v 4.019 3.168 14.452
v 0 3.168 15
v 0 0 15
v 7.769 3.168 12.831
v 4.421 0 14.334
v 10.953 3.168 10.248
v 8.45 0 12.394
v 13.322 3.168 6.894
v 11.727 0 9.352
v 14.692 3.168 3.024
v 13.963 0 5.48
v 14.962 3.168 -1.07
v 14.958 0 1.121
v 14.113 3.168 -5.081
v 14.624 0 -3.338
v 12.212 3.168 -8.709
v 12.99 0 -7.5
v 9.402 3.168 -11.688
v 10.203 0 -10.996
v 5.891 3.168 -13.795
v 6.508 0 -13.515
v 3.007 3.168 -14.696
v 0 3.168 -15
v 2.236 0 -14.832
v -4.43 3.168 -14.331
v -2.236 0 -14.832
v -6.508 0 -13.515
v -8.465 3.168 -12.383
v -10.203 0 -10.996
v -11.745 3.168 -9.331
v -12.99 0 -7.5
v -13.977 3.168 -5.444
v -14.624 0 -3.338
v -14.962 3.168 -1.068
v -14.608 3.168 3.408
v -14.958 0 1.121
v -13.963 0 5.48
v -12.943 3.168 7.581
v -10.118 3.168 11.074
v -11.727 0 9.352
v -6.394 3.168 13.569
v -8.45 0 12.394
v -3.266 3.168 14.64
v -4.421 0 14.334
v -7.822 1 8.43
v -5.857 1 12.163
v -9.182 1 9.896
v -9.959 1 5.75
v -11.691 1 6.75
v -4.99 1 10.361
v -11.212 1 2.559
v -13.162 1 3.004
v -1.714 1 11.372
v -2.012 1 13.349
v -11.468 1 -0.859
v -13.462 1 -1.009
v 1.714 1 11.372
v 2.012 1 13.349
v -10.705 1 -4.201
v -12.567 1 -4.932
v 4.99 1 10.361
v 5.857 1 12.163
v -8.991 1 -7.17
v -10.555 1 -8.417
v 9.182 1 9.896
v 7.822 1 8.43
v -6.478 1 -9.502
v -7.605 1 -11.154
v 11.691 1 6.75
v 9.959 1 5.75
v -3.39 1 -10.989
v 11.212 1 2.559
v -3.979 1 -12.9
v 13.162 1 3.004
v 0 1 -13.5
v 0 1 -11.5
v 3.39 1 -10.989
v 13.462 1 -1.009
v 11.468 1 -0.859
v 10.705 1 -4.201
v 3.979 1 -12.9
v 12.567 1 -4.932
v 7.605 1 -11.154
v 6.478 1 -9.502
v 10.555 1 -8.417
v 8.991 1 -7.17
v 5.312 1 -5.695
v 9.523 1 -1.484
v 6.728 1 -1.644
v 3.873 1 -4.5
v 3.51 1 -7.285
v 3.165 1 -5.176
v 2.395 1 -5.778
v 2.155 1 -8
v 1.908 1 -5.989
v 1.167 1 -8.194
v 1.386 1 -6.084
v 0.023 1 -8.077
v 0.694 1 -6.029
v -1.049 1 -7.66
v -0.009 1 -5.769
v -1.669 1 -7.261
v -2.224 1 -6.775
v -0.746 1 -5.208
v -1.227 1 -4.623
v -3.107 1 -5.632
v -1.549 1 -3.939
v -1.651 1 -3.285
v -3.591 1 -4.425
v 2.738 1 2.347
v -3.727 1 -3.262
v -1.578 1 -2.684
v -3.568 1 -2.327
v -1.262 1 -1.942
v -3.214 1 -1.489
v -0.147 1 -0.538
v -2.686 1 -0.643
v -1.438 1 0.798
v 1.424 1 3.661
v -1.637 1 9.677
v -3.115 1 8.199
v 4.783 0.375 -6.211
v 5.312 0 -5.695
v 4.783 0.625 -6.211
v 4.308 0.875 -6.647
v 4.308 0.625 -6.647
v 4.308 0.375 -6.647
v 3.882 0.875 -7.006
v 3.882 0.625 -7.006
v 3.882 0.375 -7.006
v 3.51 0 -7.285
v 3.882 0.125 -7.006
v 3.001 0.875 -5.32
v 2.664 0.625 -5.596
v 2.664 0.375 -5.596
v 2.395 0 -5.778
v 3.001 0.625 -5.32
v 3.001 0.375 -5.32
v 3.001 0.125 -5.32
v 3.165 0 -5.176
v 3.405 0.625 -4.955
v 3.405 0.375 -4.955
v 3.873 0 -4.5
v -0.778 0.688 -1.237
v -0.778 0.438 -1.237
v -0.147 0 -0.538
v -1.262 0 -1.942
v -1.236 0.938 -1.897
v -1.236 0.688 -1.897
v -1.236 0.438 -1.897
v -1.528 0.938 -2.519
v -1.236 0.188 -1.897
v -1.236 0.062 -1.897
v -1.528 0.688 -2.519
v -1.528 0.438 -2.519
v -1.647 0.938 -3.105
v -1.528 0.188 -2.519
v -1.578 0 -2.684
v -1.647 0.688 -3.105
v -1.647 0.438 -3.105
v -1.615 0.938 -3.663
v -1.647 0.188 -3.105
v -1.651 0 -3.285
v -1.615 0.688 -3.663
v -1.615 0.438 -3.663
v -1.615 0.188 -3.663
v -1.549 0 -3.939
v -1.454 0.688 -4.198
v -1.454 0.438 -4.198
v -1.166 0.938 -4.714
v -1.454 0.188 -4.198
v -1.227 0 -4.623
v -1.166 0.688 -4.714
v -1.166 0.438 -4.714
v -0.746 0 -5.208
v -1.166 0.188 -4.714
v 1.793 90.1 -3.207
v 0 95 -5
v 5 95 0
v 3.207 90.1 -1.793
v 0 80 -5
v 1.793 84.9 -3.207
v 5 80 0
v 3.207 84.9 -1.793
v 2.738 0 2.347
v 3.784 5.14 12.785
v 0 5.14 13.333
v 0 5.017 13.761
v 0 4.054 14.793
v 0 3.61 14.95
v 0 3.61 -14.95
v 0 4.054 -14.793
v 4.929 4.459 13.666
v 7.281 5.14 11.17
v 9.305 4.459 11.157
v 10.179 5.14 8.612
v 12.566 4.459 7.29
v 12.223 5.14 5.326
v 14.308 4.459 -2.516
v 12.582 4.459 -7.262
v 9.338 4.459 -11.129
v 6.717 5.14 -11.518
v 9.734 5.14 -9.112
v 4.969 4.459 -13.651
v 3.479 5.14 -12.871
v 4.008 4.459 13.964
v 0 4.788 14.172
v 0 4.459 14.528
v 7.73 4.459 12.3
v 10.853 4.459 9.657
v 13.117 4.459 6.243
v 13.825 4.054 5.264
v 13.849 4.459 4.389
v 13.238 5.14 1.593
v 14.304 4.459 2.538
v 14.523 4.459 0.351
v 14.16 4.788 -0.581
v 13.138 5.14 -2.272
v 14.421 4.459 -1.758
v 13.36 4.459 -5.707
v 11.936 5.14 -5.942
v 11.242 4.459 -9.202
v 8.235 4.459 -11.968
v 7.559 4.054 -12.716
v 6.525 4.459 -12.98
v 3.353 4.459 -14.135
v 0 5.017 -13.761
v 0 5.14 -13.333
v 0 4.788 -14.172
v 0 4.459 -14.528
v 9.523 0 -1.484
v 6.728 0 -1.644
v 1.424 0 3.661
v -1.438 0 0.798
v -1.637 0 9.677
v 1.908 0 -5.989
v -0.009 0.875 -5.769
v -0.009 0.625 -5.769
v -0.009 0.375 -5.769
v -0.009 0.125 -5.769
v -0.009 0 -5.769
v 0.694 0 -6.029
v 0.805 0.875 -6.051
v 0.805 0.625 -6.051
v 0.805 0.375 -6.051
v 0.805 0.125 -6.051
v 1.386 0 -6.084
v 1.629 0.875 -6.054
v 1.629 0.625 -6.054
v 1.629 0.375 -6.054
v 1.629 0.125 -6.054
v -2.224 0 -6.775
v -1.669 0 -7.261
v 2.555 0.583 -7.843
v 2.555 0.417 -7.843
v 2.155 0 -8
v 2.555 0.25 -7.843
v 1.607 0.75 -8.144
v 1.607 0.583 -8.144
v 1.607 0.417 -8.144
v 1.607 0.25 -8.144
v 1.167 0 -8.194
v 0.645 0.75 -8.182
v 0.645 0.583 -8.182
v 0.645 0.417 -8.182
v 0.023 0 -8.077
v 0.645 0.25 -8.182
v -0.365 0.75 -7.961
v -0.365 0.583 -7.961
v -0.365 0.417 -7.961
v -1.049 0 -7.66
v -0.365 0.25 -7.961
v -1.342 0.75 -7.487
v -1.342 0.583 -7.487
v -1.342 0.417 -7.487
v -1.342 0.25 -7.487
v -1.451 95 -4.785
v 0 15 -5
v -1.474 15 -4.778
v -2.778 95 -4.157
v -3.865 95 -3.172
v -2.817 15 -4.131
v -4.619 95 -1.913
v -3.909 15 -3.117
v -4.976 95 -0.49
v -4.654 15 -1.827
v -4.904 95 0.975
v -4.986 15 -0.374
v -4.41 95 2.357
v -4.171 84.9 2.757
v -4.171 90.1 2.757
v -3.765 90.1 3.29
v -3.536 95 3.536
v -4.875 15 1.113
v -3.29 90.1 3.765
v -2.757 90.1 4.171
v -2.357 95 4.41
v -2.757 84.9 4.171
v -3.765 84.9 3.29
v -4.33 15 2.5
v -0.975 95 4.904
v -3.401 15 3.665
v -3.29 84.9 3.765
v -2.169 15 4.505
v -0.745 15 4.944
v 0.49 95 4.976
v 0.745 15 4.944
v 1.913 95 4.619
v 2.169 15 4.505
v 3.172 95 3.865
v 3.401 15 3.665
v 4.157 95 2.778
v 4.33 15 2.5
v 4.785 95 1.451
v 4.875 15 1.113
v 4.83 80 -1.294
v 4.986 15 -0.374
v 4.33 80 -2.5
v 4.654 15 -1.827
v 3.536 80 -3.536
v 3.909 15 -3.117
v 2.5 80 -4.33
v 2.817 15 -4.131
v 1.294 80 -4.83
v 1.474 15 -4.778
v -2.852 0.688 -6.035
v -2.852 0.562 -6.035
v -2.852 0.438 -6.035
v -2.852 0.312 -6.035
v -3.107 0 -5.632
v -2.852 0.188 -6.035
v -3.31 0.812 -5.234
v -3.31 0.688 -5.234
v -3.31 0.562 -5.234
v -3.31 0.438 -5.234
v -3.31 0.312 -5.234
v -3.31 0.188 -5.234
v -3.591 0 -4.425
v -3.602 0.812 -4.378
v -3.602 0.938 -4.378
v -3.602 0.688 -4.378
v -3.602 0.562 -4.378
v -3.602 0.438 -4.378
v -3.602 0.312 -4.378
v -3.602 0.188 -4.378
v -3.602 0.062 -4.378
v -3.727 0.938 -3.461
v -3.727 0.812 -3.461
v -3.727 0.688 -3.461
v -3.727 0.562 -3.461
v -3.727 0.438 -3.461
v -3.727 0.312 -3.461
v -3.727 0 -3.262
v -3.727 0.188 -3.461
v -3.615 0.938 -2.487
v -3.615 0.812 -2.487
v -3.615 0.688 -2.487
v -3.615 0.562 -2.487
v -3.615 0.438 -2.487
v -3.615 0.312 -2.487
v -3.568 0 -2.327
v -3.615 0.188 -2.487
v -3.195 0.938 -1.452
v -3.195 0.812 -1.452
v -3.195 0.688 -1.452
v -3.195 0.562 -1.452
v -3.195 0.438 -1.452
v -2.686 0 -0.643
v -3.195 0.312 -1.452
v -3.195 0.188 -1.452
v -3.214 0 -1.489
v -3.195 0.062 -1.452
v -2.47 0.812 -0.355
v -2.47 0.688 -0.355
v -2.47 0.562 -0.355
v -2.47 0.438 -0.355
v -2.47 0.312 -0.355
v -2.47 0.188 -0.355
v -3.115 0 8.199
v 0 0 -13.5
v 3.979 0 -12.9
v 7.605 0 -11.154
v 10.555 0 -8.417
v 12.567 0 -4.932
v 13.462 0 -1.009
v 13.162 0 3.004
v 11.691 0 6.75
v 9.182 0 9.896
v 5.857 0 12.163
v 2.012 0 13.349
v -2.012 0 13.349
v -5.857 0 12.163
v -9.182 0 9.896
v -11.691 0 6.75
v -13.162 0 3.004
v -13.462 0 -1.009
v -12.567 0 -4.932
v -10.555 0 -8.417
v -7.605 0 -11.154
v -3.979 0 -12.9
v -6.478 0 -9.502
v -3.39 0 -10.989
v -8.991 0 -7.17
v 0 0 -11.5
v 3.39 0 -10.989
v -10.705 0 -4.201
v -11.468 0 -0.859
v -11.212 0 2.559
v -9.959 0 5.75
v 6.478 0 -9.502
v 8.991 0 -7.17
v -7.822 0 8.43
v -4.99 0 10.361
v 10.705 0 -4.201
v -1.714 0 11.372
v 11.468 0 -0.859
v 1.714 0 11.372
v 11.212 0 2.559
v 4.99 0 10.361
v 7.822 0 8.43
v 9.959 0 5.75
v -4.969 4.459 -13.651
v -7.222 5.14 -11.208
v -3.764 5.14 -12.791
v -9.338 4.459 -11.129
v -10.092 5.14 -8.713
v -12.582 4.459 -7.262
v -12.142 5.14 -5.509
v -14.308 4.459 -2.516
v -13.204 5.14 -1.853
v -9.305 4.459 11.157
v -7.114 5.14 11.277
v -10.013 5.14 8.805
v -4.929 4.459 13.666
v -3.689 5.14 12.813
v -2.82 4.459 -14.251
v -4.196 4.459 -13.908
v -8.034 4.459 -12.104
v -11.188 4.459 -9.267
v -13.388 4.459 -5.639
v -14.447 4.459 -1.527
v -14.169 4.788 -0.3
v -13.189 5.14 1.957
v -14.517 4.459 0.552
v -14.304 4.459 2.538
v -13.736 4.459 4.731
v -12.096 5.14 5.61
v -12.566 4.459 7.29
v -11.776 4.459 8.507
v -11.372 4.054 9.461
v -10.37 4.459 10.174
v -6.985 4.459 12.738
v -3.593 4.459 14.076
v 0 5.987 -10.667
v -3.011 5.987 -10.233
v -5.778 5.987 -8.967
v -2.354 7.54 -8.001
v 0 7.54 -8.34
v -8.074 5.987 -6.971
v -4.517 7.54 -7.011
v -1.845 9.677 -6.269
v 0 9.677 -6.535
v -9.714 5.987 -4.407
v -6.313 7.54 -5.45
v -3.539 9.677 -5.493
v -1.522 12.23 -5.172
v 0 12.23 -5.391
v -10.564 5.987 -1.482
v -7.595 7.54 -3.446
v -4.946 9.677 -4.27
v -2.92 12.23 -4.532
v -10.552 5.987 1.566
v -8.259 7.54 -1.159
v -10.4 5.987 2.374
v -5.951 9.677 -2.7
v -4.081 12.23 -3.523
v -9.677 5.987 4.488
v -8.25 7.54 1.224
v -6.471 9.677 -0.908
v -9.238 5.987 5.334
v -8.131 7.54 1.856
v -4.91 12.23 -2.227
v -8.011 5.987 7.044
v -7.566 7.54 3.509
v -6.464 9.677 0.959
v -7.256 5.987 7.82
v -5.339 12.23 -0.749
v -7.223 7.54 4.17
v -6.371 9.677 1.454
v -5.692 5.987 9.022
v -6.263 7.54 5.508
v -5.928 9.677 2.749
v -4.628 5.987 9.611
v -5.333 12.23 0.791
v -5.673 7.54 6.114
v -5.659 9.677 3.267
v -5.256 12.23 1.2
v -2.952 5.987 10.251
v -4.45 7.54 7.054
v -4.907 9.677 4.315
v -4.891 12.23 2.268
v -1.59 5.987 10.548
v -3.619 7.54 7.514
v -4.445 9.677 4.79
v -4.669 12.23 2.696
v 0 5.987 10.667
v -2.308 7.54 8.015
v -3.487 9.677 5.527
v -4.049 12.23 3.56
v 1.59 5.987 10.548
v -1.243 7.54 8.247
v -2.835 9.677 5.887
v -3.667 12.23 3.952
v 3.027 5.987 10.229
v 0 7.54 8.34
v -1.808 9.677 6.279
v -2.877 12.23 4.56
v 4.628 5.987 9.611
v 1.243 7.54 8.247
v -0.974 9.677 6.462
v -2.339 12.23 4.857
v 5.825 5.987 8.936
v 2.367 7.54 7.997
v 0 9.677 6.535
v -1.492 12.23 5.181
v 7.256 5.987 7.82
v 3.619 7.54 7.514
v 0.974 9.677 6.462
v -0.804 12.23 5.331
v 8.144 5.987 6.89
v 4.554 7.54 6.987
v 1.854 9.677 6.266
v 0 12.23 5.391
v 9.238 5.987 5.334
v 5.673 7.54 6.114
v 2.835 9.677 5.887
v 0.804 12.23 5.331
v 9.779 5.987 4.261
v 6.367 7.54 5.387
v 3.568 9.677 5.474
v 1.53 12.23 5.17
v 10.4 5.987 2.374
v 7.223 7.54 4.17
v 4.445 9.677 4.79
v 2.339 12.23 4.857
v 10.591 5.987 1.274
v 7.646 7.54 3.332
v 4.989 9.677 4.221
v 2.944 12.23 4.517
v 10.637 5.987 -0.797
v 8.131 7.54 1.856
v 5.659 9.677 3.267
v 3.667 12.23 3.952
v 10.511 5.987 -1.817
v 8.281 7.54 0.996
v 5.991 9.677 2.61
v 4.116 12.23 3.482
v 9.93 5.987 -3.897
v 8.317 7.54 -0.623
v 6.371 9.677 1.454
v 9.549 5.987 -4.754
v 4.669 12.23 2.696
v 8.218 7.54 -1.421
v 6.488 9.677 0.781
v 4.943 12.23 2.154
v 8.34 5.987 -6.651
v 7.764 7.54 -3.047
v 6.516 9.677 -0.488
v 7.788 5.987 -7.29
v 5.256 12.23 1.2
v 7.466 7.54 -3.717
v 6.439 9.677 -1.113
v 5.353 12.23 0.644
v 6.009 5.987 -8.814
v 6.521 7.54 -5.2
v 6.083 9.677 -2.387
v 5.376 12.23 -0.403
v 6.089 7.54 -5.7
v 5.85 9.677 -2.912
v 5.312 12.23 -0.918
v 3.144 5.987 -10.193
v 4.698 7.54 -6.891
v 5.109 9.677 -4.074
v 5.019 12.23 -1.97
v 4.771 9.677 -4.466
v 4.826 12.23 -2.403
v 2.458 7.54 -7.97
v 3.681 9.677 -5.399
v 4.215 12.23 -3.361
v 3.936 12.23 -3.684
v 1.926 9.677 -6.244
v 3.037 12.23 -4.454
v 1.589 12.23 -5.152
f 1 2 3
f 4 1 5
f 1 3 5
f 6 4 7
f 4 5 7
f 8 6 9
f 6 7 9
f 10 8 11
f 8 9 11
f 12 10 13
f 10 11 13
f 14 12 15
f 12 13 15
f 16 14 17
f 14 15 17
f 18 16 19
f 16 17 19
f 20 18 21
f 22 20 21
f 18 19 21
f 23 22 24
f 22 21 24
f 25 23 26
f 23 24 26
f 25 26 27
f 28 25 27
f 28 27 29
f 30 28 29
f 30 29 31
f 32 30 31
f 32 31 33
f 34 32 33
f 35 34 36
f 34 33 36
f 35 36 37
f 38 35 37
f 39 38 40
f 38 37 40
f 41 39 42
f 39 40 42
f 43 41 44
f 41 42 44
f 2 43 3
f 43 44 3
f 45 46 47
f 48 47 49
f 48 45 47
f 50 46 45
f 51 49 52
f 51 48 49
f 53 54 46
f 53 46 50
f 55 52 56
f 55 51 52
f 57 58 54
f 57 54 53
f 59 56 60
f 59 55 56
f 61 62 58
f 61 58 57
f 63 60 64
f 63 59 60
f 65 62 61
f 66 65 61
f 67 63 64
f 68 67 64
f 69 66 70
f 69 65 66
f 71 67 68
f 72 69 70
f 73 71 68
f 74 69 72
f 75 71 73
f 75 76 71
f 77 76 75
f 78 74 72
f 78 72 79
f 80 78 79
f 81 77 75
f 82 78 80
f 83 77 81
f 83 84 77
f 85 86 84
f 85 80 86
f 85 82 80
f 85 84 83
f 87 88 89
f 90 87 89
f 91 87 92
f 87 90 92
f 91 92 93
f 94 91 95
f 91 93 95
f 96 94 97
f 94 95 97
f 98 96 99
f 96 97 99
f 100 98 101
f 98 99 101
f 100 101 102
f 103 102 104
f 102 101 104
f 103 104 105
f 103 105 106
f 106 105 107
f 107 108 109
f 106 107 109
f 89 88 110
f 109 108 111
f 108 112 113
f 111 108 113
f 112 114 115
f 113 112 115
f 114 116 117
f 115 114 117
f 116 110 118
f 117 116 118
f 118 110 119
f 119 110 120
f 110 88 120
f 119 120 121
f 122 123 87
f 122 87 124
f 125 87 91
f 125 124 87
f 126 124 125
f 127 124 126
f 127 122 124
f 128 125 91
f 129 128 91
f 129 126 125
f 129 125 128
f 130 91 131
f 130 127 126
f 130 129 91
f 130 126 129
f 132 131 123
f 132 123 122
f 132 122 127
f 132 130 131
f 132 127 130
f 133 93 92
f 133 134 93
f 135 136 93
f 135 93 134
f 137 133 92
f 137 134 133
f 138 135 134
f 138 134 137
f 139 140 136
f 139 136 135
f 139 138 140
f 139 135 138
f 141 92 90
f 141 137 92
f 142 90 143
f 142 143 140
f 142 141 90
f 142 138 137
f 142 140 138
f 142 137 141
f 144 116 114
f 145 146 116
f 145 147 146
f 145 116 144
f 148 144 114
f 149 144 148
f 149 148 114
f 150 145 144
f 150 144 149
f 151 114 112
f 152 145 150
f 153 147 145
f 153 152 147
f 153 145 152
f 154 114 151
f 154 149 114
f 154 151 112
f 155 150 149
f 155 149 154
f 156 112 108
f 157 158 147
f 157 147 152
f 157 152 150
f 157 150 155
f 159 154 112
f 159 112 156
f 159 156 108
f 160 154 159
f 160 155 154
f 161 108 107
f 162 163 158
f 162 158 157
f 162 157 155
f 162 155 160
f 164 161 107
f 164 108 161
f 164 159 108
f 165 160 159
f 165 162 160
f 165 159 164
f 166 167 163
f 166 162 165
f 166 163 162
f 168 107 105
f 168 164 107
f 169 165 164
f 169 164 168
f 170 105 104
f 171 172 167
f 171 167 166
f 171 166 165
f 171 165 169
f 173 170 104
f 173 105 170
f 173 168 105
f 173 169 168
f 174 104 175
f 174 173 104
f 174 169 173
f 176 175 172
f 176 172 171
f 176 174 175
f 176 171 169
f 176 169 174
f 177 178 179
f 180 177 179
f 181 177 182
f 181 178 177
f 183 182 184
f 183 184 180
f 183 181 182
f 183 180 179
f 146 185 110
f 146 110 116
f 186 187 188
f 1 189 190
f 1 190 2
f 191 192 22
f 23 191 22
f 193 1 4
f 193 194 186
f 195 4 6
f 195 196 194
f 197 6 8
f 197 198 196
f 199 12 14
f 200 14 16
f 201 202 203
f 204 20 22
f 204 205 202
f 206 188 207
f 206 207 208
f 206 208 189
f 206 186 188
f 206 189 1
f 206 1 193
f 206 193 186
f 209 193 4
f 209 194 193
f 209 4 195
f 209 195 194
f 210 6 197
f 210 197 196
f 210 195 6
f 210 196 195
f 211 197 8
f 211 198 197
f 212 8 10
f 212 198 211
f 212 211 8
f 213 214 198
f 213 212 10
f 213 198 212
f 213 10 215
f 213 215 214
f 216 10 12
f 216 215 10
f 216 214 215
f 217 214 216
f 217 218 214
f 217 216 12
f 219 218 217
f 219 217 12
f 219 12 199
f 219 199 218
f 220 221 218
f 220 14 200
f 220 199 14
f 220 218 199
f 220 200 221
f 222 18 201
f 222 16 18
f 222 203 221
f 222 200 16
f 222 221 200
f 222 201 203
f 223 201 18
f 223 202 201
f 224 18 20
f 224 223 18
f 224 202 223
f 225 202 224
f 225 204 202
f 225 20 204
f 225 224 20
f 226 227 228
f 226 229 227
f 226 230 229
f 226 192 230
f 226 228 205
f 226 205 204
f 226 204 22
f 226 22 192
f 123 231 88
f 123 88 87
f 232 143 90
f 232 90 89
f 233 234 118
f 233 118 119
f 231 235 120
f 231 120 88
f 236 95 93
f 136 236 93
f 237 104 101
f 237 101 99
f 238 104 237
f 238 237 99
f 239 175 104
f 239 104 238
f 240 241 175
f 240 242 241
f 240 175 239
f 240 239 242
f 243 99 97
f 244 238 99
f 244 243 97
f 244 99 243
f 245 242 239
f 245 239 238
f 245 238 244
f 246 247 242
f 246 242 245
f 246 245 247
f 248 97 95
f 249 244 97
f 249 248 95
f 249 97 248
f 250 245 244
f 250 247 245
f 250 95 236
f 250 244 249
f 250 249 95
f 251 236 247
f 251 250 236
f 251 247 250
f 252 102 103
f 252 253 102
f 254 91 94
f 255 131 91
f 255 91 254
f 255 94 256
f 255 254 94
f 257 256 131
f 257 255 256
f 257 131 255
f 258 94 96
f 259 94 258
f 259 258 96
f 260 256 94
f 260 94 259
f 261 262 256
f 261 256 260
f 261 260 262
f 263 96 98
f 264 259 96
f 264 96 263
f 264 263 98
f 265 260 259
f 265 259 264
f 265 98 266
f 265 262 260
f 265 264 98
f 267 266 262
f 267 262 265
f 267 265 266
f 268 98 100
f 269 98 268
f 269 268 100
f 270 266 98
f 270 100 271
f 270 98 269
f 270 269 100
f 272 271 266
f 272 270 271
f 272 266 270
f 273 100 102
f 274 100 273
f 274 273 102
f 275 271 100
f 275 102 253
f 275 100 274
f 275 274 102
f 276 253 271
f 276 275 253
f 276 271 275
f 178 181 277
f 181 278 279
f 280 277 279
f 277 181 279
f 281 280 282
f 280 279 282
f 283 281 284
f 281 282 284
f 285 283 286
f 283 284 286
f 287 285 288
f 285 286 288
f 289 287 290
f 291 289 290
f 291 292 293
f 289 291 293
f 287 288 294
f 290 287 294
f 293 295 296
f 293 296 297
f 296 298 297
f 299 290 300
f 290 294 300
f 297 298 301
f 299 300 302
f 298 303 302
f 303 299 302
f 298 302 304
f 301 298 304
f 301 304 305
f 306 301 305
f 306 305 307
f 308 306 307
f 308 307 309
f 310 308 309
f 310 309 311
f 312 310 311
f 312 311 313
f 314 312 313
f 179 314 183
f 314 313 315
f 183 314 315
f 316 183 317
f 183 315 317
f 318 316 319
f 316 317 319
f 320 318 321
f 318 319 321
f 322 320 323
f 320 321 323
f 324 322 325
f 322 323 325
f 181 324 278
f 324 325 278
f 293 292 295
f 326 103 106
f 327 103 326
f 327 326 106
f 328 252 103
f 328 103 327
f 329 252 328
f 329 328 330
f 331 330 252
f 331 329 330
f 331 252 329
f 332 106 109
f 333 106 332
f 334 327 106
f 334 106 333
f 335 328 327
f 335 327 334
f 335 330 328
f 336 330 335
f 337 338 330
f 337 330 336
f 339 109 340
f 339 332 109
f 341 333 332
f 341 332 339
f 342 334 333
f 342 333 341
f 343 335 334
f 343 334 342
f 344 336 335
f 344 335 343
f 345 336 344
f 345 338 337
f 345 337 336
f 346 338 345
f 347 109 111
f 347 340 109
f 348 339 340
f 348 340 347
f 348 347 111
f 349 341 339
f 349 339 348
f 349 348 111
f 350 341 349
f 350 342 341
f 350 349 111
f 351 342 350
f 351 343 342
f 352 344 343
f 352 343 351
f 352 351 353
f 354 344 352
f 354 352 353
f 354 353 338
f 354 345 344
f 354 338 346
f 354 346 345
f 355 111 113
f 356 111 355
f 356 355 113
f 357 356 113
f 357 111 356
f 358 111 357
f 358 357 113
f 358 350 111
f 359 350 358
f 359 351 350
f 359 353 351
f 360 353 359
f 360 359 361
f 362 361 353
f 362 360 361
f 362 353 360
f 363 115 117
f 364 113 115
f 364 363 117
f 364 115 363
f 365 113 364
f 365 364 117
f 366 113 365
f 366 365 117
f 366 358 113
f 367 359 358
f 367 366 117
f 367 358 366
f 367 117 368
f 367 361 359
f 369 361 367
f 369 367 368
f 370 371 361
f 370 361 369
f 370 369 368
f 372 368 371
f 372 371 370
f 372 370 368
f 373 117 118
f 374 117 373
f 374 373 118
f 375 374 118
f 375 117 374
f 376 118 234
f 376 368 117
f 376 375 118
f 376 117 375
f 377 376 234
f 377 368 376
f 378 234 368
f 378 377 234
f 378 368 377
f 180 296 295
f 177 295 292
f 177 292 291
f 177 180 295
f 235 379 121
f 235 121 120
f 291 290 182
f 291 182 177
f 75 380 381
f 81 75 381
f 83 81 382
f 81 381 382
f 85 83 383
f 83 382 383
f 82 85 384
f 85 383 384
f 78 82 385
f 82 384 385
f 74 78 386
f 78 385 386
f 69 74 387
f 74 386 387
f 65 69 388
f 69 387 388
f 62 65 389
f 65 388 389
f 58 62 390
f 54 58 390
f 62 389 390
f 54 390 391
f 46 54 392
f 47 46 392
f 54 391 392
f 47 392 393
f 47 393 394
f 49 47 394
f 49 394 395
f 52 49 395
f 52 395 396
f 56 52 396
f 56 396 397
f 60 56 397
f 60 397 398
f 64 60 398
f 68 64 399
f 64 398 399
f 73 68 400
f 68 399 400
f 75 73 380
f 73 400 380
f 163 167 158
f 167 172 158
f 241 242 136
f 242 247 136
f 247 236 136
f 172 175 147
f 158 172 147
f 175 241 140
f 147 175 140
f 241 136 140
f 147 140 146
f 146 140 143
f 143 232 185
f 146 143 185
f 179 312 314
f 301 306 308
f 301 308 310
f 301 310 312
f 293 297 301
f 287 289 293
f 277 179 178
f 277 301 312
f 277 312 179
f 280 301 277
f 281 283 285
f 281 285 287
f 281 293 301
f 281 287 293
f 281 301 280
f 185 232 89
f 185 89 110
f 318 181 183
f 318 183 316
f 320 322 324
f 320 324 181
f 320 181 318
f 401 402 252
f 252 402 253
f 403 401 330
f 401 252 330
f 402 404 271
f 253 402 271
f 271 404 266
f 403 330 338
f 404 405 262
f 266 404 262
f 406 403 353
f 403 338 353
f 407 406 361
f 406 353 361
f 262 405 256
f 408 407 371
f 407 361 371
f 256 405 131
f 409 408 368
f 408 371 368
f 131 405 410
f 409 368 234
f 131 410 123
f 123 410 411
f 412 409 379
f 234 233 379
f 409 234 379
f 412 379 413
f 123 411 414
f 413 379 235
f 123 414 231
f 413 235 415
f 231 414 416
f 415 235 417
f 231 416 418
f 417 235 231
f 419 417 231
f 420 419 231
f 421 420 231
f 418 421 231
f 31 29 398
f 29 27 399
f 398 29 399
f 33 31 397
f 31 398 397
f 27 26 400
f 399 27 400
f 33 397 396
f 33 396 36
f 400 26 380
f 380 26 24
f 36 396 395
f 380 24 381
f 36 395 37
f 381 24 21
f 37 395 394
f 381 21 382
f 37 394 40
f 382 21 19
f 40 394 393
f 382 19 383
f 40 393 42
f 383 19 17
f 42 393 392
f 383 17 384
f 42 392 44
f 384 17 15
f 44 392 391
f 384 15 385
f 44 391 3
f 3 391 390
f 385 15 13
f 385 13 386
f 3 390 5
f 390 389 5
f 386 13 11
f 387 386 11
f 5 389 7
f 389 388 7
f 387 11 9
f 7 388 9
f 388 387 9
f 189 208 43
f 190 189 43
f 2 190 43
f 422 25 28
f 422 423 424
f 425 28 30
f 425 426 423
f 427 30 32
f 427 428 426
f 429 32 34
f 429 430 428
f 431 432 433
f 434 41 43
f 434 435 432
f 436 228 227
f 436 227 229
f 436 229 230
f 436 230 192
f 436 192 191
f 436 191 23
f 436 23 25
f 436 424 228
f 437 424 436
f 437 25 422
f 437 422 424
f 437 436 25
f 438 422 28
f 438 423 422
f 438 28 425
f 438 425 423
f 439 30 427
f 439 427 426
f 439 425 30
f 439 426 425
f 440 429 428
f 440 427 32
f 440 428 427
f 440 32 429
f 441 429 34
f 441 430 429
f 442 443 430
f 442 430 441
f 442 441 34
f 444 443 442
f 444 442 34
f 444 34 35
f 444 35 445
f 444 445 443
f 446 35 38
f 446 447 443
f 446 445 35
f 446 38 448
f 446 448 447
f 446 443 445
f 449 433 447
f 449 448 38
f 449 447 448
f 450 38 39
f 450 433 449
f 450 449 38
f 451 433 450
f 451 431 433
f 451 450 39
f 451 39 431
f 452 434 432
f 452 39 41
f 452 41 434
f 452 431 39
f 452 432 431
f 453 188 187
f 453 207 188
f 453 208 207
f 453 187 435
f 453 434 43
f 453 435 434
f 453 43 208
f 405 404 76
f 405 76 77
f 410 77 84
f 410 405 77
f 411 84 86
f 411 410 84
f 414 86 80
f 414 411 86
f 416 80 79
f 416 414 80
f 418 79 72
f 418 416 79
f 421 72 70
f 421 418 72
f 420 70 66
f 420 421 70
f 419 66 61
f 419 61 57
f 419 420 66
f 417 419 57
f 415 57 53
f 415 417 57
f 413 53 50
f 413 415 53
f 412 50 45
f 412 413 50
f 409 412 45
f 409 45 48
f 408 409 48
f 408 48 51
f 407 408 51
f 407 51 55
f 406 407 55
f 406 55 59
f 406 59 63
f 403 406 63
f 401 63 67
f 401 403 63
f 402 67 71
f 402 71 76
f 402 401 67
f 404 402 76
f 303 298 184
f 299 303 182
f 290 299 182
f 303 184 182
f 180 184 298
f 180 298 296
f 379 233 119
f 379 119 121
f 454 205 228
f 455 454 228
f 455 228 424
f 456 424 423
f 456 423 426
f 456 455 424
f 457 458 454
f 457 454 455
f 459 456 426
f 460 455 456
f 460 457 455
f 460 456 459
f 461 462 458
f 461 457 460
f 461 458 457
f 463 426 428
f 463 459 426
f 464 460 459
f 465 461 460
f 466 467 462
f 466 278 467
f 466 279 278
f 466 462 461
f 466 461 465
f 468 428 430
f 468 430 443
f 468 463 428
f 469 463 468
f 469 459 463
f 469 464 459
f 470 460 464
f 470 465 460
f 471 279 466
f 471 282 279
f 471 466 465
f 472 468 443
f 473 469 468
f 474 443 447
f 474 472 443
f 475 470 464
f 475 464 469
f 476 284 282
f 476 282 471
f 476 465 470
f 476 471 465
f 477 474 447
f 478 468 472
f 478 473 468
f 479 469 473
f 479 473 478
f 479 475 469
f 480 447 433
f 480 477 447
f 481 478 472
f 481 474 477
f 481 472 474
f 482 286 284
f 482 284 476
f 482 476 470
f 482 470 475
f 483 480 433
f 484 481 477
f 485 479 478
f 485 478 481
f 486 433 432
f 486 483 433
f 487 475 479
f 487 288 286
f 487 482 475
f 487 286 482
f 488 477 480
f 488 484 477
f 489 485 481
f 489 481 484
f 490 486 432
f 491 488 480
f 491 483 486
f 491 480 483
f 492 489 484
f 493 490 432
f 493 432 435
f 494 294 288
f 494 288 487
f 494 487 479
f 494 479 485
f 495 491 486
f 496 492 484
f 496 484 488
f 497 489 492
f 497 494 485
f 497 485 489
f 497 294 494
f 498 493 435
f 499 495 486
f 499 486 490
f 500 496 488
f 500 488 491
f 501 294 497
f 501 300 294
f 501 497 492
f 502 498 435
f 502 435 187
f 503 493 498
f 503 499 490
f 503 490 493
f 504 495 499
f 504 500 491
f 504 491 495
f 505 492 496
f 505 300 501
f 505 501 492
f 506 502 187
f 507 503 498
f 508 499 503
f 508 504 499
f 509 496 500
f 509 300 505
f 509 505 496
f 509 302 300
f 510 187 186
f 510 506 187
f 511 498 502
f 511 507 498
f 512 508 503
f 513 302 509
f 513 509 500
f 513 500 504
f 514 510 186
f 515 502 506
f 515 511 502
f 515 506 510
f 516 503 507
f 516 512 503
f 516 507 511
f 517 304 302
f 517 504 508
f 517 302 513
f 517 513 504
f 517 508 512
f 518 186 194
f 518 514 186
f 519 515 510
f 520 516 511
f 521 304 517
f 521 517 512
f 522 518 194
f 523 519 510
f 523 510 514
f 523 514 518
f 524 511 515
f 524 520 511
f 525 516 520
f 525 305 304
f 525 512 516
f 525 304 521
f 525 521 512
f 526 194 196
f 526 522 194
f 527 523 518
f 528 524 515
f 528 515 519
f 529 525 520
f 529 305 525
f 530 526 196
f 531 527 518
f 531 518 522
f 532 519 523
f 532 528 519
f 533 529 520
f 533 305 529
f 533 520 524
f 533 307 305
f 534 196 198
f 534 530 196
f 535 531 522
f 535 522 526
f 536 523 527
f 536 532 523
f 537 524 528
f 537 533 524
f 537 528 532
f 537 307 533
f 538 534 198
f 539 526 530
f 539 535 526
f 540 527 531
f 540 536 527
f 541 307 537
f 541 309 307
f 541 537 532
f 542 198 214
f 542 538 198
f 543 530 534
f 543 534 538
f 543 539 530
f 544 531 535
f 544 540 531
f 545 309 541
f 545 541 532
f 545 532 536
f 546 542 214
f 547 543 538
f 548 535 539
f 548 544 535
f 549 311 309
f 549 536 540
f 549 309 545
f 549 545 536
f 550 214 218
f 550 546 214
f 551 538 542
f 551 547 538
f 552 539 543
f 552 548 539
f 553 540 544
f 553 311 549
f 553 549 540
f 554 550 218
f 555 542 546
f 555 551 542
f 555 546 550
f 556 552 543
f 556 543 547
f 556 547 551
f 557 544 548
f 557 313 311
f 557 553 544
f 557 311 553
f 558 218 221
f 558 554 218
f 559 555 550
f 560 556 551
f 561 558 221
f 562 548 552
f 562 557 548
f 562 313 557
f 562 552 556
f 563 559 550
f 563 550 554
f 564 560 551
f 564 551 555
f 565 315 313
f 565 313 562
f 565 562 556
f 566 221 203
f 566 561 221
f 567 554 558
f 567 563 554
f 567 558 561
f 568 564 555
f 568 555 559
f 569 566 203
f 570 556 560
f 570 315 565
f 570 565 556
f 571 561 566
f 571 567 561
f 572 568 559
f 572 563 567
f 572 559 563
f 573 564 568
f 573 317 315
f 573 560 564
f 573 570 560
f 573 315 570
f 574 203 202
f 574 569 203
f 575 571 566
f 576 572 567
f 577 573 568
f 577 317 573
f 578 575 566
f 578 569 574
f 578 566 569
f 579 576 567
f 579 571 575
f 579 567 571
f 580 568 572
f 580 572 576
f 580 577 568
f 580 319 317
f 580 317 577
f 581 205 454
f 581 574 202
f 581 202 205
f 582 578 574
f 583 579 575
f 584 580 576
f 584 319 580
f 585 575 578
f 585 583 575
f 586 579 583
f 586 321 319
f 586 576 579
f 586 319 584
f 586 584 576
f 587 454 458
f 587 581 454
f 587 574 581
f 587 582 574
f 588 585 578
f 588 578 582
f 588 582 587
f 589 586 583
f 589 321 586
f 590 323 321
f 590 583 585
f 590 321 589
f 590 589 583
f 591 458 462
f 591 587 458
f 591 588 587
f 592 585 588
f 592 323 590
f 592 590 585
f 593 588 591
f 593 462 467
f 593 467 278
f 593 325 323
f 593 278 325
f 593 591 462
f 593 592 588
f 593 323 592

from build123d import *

# Parameters (mm, degrees)
SKETCH1_R           = 15
BOSS_EXTRUDE1_DEPTH = 5
SKETCH2_R           = 5
BOSS_EXTRUDE2_DEPTH = 90
CUT_EXTRUDE1_START  = -15
CUT_EXTRUDE1_DEPTH  = 15
SKETCH4_W           = 2
SKETCH4_H           = 5.2
CUT_EXTRUDE2_DEPTH  = 99.17076958
FILLET1_R           = 10
FILLET2_R           = 2
CUT_EXTRUDE3_DEPTH  = 1
SKETCH6_R           = 13.5
SKETCH6_R_2         = 11.5
CUT_EXTRUDE4_DEPTH  = 1


with BuildPart() as part:
    # Sketch1 → Boss-Extrude1 (new body)
    with BuildSketch(Plane(origin=(0, 0, 0), x_dir=(1, 0, 0), z_dir=(0, 1, 0))):
        with Locations(Location((0, 0, 0), (0, 0, 270))):
            Circle(SKETCH1_R)
    extrude(amount=BOSS_EXTRUDE1_DEPTH)

    # Sketch2 → Boss-Extrude2 (add)
    with BuildSketch(Plane(origin=(0, 5, 0), x_dir=(1, 0, 0), z_dir=(0, 1, 0))):
        with Locations(Location((0, 0, 0), (0, 0, 90))):
            Circle(SKETCH2_R)
    extrude(amount=BOSS_EXTRUDE2_DEPTH)

    # Sketch3 → Cut-Extrude1 (cut)
    with BuildSketch(Plane(origin=(0, 95, 0), x_dir=(1, 0, 0), z_dir=(0, 1, 0)).offset(CUT_EXTRUDE1_START)):
        with BuildLine():
            Line((0, 5), (5, 0))
            ThreePointArc((5, 0), (3.535533906, 3.535533906), (0, 5))
        make_face()
    extrude(amount=CUT_EXTRUDE1_DEPTH, mode=Mode.SUBTRACT)

    # Sketch4 → Cut-Extrude2 (cut, through all)
    with BuildSketch(Plane(origin=(2.5, 0, -2.5), x_dir=(-0.7071067811865475, 0, -0.7071067811865477), z_dir=(0.7071067811865477, 0, -0.7071067811865475))):
        with Locations((0, 87.5)):
            Rectangle(SKETCH4_W, SKETCH4_H)
    extrude(amount=-CUT_EXTRUDE2_DEPTH, mode=Mode.SUBTRACT)

    # Fillet1
    fillet1_edges = [part.edges().sort_by_distance(p)[0] for p in [
        (0, 5, 5),
    ]]
    fillet(fillet1_edges, radius=FILLET1_R - 0.0001)  # a hair under: the kernel refuses the full size

    # Fillet2
    fillet2_edges = [part.edges().sort_by_distance(p)[0] for p in [
        (0, 5, -15),
    ]]
    fillet(fillet2_edges, radius=FILLET2_R)

    # Sketch5 → Cut-Extrude3 (cut)
    with BuildSketch(Plane.XZ):
        with BuildLine():
            Line((-1.637065711, 9.676642787), (9.523190699, -1.483613623))
            Line((9.523190699, -1.483613623), (5.311652237, -5.695152084))
            add(Edge.make_bspline(
                [(5.311652237, -5.695152084), (5.222138514, -5.784060594), (5.04738551, -5.957632072), (4.789980879, -6.205637327), (4.545170464, -6.434144406), (4.314659572, -6.644098006), (4.09362148, -6.830927906), (3.889758382, -7.002719589), (3.69565283, -7.150200035), (3.570345293, -7.241295339), (3.510370186, -7.284895674)],
                knots=[0, 0, 0, 0, 1.258886347, 2.457658598, 3.566401057, 4.600468819, 5.568286539, 6.454134328, 7.260112675, 8, 8, 8, 8], degree=3))
            add(Edge.make_bspline(
                [(3.510370186, -7.284895674), (3.352057488, -7.391657893), (3.045888719, -7.598130638), (2.566454347, -7.848616029), (2.088709315, -8.031605789), (1.611555846, -8.155041162), (1.129098311, -8.206051584), (0.637891361, -8.192108975), (0.134888923, -8.11428248), (-0.372633356, -7.969030769), (-0.872601546, -7.763082396), (-1.351797855, -7.491862034), (-1.809467136, -7.167166368), (-2.084445811, -6.906961882), (-2.223604173, -6.775280289)],
                knots=[0, 0, 0, 0, 1.085817505, 2.099916266, 3.069631314, 3.991048598, 4.895916369, 5.820176367, 6.779587027, 7.784039251, 8.816928408, 9.848367769, 10.911124231, 12, 12, 12, 12], degree=3))
            add(Edge.make_bspline(
                [(-2.223604173, -6.775280289), (-2.336734542, -6.656352184), (-2.56008707, -6.421553226), (-2.855775684, -6.042833727), (-3.106227984, -5.64686054), (-3.315994358, -5.238308237), (-3.484073648, -4.815633421), (-3.609745523, -4.377562245), (-3.691600055, -3.924500762), (-3.737830146, -3.456793519), (-3.718915595, -2.972046746), (-3.62400832, -2.471794707), (-3.445196287, -1.960272191), (-3.195874633, -1.431943292), (-2.869308405, -0.889700641), (-2.464234681, -0.334885684), (-1.986644206, 0.236940057), (-1.625835114, 0.606436234), (-1.438347763, 0.798437659)],
                knots=[0, 0, 0, 0, 0.905918046, 1.788547915, 2.647703894, 3.489284766, 4.320694788, 5.155279578, 6.001046779, 6.859817908, 7.745360365, 8.669757575, 9.660298499, 10.729041634, 11.890420876, 13.149445516, 14.5187654, 16, 16, 16, 16], degree=3))
            Line((-1.438347763, 0.798437659), (1.423831724, 3.660617146))
            Line((1.423831724, 3.660617146), (-3.114629814, 8.199078685))
            Line((-3.114629814, 8.199078685), (-1.637065711, 9.676642787))
        make_face()
        with BuildLine():
            Line((2.737934289, 2.346514582), (-0.146681096, -0.538100802))
            add(Edge.make_bspline(
                [(-0.146681096, -0.538100802), (-0.260313381, -0.65428127), (-0.479959168, -0.878852573), (-0.773260091, -1.224420889), (-1.027081256, -1.559053853), (-1.234921637, -1.885549874), (-1.405033378, -2.201516333), (-1.532005524, -2.509259236), (-1.61338181, -2.809868657), (-1.653183343, -3.102018529), (-1.651825971, -3.386261795), (-1.620270356, -3.663837107), (-1.554866401, -3.935764915), (-1.458636403, -4.202624086), (-1.328091019, -4.463959906), (-1.167765432, -4.721763246), (-0.971104209, -4.971210552), (-0.822117923, -5.127940531), (-0.74604007, -5.207972597)],
                knots=[0, 0, 0, 0, 1.445903498, 2.794862496, 4.030928865, 5.180949829, 6.23580341, 7.221038598, 8.136693834, 9.000005142, 9.836726991, 10.659941899, 11.480957457, 12.32010686, 13.179061295, 14.076063356, 15.017567502, 16, 16, 16, 16], degree=3))
            add(Edge.make_bspline(
                [(-0.74604007, -5.207972597), (-0.6293357, -5.316302566), (-0.402138795, -5.527196413), (-0.019259163, -5.776250817), (0.382841414, -5.956890263), (0.800723528, -6.060399706), (1.219698662, -6.102803811), (1.630125751, -6.06432865), (2.028390936, -5.964880448), (2.271917157, -5.841059549), (2.394985571, -5.778485418)],
                knots=[0, 0, 0, 0, 1.110082986, 2.161079462, 3.172912607, 4.173354109, 5.154591278, 6.098016453, 7.038813575, 8, 8, 8, 8], degree=3))
            add(Edge.make_bspline(
                [(2.394985571, -5.778485418), (2.438170358, -5.752446879), (2.531164584, -5.696375427), (2.67205046, -5.59014108), (2.83334386, -5.466586503), (3.006975281, -5.314717262), (3.201771433, -5.144293582), (3.410529337, -4.950105092), (3.637256703, -4.7334163), (3.791622967, -4.580044579), (3.872549673, -4.499639264)],
                knots=[0, 0, 0, 0, 0.617675747, 1.330104431, 2.160457084, 3.107811318, 4.156123608, 5.332972174, 6.601807352, 8, 8, 8, 8], degree=3))
            Line((3.872549673, -4.499639264), (6.728318904, -1.643870033))
            Line((6.728318904, -1.643870033), (2.737934289, 2.346514582))
        make_face(mode=Mode.SUBTRACT)
    extrude(amount=-CUT_EXTRUDE3_DEPTH, mode=Mode.SUBTRACT)

    # Sketch6 → Cut-Extrude4 (cut)
    with BuildSketch(Plane.XZ):
        with Locations(Location((0, 0, 0), (0, 0, 270))):
            Circle(SKETCH6_R)
        with Locations(Location((0, 0, 0), (0, 0, 270))):
            Circle(SKETCH6_R_2, mode=Mode.SUBTRACT)
    extrude(amount=-CUT_EXTRUDE4_DEPTH, mode=Mode.SUBTRACT)


solid = part.part
